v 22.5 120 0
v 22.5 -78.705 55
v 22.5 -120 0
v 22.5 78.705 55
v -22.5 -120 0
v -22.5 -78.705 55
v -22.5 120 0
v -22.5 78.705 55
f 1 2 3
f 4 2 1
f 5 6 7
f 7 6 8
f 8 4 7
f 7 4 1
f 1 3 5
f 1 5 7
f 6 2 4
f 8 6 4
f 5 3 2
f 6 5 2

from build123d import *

# Parameters (mm, degrees)
F0_W     = 35
F0_H     = 240
F1_DEPTH = 3
F2_W     = 240
F2_H     = 55
F3_DEPTH = 22.5
F5_DEPTH = 45.001


with BuildPart() as f1:
    # F0 (on Top) → F1 (new body)
    with BuildSketch(Plane.XY):
        Rectangle(F0_W, F0_H)
    extrude(amount=F1_DEPTH)

    # F2 (on Right) → F3 (join, symmetric)
    with BuildSketch(Plane.YZ):
        with Locations((0, 27.5)):
            Rectangle(F2_W, F2_H)
    extrude(amount=F3_DEPTH, both=True)

    # F4 (on face) → F5 (cut, through all)
    with BuildSketch(Plane.YZ.offset(22.5)):
        Polygon((-120, 55), (-120, 0), (-78.704832, 55), align=None)
        Polygon((78.704832, 55), (120, 0), (120, 55), align=None)
    extrude(amount=-F5_DEPTH, mode=Mode.SUBTRACT)


solid = f1.part
